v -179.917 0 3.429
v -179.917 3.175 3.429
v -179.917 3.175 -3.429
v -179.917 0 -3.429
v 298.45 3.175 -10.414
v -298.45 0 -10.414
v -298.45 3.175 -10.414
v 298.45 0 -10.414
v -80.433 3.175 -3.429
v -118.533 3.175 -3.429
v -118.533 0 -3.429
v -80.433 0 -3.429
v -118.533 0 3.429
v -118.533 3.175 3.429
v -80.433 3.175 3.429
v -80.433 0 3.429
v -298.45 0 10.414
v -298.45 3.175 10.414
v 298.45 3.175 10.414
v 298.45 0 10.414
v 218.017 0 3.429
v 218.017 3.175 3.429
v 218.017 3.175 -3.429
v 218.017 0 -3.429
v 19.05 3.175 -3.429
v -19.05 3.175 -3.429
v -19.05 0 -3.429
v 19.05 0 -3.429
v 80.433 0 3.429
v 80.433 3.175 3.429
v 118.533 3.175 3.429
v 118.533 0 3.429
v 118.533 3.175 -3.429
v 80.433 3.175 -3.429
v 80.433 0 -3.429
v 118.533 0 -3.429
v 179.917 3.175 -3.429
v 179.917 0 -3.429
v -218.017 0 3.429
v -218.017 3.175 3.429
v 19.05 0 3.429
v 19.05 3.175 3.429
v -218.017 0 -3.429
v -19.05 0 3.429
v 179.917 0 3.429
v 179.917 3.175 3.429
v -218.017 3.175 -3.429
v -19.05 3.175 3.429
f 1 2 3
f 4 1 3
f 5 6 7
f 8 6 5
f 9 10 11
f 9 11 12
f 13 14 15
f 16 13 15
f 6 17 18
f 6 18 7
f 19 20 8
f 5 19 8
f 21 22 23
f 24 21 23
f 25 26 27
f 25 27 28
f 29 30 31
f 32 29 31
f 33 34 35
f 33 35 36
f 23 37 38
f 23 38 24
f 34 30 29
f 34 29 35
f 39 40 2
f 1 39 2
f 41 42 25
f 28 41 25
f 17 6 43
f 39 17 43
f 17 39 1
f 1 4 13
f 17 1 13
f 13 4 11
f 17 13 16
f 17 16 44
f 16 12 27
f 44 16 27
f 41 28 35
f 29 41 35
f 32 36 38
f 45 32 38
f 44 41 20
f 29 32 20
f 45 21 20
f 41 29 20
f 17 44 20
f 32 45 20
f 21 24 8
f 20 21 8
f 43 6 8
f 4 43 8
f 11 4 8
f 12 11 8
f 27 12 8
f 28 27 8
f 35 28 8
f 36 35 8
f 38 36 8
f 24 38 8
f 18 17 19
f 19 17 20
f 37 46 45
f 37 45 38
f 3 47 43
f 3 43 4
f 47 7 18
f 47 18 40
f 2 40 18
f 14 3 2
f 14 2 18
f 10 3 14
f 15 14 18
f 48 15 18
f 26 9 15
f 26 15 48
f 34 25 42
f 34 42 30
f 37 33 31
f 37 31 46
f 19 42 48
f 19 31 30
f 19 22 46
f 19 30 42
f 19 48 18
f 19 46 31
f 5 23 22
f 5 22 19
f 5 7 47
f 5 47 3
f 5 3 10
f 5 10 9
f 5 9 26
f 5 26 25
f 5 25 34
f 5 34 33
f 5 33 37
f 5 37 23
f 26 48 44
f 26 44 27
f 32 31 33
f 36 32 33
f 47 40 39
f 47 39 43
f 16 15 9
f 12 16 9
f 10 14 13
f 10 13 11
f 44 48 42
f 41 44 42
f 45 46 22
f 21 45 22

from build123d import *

# Parameters (mm, degrees)
SKETCH1_W           = 596.9
SKETCH1_H           = 20.828
BOSS_EXTRUDE1_DEPTH = 3.175
SKETCH5_W           = 38.1
SKETCH5_H           = 6.858
CUT_EXTRUDE2_DEPTH  = 299.648513341


with BuildPart() as part:
    # Sketch1 → Boss-Extrude1 (new body)
    with BuildSketch(Plane(origin=(0, 0, 0), x_dir=(1, 0, 0), z_dir=(0, 1, 0))):
        Rectangle(SKETCH1_W, SKETCH1_H)
    extrude(amount=BOSS_EXTRUDE1_DEPTH)

    # Sketch5 → Cut-Extrude2 (cut, through all)
    with BuildSketch(Plane(origin=(0, 3.175, 0), x_dir=(1, 0, 0), z_dir=(0, 1, 0))):
        with Locations((-198.966666582, 0)):
            Rectangle(SKETCH5_W, SKETCH5_H)
        with Locations((-99.483333164, 0)):
            Rectangle(SKETCH5_W, SKETCH5_H)
        with Locations((1.69e-07, 0)):
            Rectangle(SKETCH5_W, SKETCH5_H)
        with Locations((99.483333333, 0)):
            Rectangle(SKETCH5_W, SKETCH5_H)
        with Locations((198.966666667, 0)):
            Rectangle(SKETCH5_W, SKETCH5_H)
    extrude(amount=-CUT_EXTRUDE2_DEPTH, mode=Mode.SUBTRACT)


solid = part.part
